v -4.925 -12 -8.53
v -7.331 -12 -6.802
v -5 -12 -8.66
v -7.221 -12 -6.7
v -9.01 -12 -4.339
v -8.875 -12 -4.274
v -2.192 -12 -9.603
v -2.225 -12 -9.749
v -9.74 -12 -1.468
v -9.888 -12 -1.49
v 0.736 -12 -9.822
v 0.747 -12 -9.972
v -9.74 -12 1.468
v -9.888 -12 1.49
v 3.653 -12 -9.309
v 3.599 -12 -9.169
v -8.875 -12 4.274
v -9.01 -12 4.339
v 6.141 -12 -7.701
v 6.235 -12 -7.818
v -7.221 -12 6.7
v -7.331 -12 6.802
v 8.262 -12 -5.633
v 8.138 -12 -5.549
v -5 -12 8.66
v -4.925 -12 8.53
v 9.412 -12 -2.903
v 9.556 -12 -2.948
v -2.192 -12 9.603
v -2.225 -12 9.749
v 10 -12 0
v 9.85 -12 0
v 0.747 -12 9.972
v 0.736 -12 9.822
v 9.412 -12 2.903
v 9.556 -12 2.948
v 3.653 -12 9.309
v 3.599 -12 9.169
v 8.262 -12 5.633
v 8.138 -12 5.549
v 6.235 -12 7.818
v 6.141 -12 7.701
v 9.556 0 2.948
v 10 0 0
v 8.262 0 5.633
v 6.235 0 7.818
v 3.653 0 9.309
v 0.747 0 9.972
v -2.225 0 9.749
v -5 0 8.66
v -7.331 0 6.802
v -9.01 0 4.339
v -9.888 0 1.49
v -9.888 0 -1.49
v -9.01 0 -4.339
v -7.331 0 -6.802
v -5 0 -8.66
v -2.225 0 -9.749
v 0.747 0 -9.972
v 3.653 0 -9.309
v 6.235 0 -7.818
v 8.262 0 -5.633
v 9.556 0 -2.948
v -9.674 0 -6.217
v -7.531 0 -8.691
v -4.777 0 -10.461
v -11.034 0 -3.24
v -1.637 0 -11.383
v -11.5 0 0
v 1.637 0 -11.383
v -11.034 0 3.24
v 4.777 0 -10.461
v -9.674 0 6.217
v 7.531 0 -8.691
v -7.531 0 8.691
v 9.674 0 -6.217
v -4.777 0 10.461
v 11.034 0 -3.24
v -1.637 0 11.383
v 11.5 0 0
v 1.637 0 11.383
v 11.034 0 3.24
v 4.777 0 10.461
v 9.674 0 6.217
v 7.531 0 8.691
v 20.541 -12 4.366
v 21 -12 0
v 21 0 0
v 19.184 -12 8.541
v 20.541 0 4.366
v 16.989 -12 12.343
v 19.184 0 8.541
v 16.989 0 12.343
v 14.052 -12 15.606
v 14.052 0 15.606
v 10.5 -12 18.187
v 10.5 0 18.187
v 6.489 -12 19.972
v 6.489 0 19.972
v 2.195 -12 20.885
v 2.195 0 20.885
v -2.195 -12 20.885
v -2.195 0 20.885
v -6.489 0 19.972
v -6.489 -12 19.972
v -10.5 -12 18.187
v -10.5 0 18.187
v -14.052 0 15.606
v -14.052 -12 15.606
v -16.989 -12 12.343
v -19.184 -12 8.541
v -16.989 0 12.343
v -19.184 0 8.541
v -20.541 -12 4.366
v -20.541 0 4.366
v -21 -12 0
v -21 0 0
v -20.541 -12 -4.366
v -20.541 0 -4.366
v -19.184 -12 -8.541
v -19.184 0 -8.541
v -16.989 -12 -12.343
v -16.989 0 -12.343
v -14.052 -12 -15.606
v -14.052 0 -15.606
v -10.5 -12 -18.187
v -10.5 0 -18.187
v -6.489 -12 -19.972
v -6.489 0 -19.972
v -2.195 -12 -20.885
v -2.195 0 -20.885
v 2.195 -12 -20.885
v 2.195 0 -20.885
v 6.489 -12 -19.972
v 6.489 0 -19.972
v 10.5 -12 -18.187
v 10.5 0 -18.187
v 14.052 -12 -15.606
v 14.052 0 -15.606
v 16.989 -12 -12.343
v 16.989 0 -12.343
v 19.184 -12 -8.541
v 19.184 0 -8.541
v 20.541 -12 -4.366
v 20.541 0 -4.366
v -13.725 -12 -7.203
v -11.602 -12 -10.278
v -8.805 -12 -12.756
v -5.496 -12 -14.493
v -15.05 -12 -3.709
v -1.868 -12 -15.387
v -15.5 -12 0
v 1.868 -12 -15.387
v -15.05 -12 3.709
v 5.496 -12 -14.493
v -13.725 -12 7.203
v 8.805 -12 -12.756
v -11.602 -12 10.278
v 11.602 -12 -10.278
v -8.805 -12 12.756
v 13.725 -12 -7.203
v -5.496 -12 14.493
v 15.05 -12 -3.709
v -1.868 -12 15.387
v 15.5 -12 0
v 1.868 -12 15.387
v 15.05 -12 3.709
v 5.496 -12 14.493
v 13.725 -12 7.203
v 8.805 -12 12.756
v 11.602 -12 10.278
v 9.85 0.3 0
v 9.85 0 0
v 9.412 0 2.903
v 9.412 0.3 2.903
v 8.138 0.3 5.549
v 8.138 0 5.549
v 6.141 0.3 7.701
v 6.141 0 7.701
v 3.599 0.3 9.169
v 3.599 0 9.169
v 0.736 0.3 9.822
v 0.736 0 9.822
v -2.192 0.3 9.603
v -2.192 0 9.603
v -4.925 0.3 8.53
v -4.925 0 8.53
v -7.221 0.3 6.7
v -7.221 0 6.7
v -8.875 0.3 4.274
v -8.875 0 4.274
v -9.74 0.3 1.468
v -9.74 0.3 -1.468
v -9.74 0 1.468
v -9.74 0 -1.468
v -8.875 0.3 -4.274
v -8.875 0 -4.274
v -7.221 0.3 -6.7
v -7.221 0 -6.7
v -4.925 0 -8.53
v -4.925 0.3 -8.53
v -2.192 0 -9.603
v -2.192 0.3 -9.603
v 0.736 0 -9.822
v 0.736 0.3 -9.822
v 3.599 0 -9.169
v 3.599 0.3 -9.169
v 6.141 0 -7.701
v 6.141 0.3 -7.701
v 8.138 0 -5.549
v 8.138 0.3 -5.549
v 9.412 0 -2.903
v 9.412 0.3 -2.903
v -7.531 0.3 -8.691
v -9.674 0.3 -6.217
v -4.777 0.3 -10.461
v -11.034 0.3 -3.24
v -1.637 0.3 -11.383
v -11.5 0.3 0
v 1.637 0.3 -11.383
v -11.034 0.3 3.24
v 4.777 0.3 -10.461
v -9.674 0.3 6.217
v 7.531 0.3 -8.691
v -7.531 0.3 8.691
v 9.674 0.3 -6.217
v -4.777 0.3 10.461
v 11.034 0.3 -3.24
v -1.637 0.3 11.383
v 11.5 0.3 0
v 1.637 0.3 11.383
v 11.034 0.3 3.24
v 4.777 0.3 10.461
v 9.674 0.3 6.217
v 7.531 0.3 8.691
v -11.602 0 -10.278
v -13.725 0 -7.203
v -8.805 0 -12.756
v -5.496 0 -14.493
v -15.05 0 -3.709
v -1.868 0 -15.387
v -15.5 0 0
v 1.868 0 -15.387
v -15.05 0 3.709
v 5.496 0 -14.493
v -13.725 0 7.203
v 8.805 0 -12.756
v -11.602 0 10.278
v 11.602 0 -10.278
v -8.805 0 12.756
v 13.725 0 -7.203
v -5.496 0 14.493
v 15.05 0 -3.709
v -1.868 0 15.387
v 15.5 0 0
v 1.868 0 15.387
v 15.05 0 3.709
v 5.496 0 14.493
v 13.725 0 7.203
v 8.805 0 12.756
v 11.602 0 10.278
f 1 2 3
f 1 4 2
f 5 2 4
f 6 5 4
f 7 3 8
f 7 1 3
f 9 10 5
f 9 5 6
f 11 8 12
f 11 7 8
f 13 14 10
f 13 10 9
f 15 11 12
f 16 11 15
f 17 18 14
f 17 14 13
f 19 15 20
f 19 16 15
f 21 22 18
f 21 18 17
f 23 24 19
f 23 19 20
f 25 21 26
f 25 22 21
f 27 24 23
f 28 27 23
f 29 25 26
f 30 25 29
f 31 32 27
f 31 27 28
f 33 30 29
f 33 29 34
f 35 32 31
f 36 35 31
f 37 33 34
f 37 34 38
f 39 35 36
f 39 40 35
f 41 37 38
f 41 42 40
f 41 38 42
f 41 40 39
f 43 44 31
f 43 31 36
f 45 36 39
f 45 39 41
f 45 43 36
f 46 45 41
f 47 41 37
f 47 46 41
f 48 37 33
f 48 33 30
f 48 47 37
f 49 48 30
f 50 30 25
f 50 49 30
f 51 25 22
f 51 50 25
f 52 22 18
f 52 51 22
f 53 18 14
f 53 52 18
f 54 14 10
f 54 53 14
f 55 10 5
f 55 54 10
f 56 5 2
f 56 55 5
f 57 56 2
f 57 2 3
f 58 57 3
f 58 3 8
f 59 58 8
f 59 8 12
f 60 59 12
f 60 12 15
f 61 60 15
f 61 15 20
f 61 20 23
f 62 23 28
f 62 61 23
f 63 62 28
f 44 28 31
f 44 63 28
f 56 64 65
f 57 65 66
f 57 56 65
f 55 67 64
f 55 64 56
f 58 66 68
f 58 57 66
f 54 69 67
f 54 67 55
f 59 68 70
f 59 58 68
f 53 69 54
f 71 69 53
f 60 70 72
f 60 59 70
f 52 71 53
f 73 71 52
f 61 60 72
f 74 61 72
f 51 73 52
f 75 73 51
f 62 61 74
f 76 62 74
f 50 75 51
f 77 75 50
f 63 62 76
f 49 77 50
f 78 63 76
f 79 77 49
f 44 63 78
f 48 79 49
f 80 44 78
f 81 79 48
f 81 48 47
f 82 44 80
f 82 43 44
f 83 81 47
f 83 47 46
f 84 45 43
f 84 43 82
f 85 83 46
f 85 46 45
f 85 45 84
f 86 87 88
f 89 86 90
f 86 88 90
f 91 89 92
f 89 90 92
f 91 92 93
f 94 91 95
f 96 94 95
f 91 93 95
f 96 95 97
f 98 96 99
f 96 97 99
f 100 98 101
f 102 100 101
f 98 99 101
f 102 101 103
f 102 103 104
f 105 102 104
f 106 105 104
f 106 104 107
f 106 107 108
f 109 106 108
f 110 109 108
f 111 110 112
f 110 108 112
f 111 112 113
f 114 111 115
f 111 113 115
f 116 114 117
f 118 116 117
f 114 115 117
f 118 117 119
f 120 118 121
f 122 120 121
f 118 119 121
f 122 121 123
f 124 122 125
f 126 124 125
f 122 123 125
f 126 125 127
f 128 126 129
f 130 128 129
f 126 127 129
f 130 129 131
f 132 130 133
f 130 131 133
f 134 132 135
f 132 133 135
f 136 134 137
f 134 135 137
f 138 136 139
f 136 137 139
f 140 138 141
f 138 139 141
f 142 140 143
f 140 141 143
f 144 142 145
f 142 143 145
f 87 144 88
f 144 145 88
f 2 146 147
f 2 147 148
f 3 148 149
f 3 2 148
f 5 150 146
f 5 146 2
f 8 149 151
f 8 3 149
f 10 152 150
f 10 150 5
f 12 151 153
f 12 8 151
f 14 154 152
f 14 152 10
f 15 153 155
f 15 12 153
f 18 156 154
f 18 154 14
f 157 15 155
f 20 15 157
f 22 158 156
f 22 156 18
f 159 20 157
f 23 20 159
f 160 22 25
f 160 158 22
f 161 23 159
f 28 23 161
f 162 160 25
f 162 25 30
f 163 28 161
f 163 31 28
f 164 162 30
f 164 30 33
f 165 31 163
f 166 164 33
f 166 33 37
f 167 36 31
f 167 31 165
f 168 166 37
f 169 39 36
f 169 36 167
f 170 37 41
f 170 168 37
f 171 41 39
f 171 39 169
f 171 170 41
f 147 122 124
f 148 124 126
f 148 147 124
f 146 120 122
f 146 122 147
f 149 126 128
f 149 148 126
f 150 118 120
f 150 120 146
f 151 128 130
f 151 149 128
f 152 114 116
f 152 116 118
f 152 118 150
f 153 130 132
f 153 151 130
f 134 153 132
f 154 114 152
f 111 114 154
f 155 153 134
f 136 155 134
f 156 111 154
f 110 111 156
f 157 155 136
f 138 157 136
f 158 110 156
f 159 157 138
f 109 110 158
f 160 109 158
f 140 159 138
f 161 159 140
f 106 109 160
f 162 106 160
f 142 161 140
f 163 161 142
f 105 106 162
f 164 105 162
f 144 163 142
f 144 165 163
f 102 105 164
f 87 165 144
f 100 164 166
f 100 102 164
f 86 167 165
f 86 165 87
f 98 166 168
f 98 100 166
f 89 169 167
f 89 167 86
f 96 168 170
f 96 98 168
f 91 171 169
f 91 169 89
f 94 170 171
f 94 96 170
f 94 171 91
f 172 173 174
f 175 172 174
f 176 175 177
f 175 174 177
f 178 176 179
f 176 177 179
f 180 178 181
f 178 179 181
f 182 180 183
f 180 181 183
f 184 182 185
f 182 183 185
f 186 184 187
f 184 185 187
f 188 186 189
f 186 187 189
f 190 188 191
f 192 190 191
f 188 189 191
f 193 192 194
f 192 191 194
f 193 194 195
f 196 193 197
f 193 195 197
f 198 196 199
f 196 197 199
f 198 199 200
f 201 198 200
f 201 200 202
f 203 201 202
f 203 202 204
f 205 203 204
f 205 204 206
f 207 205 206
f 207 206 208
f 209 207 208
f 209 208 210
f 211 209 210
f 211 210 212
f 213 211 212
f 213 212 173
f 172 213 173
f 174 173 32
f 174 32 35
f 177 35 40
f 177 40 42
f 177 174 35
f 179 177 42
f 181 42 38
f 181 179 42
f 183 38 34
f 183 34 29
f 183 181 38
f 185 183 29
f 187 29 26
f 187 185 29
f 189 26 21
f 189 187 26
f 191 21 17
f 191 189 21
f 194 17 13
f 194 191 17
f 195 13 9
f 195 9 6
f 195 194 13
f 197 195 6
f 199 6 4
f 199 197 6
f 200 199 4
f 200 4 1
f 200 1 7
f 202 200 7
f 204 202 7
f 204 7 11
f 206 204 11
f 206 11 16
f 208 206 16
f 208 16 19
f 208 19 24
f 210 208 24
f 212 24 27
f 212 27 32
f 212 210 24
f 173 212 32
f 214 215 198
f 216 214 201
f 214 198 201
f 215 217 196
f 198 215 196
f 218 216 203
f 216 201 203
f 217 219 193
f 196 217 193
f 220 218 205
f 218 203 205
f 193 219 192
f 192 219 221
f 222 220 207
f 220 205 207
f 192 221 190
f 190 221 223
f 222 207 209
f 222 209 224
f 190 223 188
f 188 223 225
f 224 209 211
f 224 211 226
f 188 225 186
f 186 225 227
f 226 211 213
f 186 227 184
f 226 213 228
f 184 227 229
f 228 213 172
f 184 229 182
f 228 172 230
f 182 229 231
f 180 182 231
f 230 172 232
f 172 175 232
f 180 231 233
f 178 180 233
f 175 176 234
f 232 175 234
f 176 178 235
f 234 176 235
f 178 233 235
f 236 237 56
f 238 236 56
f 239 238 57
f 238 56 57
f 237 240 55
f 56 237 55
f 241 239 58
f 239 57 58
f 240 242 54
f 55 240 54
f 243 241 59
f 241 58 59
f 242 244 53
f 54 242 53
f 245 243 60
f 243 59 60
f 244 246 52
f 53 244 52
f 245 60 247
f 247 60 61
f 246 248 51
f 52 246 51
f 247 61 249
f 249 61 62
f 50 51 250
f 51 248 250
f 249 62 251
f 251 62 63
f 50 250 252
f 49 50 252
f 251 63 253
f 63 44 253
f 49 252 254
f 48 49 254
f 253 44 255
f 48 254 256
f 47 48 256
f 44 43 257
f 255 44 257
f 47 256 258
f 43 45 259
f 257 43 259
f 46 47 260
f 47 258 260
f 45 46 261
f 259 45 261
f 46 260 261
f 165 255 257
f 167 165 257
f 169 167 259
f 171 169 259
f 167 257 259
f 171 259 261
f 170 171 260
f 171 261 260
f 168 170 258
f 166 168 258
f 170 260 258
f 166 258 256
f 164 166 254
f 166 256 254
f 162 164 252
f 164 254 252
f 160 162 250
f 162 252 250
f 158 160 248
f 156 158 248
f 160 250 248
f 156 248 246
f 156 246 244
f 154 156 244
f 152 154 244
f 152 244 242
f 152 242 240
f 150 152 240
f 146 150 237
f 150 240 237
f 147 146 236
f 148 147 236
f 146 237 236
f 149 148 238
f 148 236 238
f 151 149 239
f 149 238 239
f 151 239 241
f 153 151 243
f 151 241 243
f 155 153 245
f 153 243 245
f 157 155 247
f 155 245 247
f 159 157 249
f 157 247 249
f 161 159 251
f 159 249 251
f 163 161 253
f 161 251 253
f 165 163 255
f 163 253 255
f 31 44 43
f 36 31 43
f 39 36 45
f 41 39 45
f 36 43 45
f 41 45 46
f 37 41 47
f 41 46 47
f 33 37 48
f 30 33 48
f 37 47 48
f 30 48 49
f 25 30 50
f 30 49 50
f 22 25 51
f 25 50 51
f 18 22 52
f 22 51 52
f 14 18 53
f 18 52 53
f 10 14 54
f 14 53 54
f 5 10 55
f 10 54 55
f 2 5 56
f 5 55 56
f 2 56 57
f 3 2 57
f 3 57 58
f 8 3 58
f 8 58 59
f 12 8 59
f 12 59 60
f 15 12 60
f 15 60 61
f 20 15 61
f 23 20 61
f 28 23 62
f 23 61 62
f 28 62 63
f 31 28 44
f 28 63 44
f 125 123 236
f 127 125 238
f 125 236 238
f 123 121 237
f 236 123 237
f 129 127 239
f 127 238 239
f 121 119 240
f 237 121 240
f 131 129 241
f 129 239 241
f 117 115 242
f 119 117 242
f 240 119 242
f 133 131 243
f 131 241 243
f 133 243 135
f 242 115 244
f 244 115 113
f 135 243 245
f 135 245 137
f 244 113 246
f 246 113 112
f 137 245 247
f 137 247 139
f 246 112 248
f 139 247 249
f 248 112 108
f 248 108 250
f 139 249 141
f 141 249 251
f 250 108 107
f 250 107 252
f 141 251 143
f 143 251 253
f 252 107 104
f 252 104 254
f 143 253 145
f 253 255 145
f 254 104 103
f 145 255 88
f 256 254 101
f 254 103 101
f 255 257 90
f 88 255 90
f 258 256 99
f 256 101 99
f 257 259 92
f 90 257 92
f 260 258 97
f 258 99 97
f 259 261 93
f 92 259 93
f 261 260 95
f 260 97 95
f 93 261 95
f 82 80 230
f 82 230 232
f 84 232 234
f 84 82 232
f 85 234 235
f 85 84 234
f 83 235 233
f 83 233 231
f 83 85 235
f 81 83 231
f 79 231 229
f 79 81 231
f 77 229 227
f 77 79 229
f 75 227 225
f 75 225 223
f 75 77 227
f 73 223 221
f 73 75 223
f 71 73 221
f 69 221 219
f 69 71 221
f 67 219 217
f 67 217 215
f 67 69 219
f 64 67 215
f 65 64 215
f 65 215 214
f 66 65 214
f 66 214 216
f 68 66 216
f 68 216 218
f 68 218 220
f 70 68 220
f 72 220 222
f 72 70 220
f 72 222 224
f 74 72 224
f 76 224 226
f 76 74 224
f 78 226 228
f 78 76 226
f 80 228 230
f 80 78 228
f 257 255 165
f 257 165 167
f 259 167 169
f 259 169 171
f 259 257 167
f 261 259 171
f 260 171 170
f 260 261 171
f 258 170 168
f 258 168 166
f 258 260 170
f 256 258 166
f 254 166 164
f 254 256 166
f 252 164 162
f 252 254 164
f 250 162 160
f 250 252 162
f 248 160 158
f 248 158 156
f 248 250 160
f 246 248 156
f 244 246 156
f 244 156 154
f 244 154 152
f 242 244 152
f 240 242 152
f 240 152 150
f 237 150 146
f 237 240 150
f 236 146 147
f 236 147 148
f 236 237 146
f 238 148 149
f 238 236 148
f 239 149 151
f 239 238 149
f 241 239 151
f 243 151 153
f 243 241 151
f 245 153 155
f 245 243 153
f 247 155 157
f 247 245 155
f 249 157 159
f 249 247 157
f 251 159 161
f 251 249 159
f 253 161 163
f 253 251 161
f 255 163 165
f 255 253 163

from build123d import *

# Parameters (mm, degrees)
F0_R     = 21
F0_R_2   = 15.5
F1_DEPTH = 12
F0_R_3   = 10
F2_DEPTH = 12
F3_R     = 10
F3_R_2   = 9.85
F4_DEPTH = 12
F3_R_3   = 11.5
F5_DEPTH = 0.3
F6_DEPTH = 25


with BuildPart() as f1:
    # F0 (on Front) → F1 (new body)
    with BuildSketch(Plane.XZ):
        Circle(F0_R)
        Circle(F0_R_2, mode=Mode.SUBTRACT)
    extrude(amount=F1_DEPTH)


with BuildPart() as f2:
    # F0 (on Front) → F2 (new body)
    with BuildSketch(Plane.XZ):
        Circle(F0_R_2)
        Circle(F0_R_3, mode=Mode.SUBTRACT)
    extrude(amount=F2_DEPTH)


with BuildPart() as f4:
    # F3 (on Front) → F4 (new body)
    with BuildSketch(Plane.XZ):
        Circle(F3_R)
        Circle(F3_R_2, mode=Mode.SUBTRACT)
    extrude(amount=F4_DEPTH)

    # F3 (on Front) → F5 (join)
    with BuildSketch(Plane.XZ):
        Circle(F3_R_3)
        Circle(F3_R, mode=Mode.SUBTRACT)
        Circle(F3_R)
        Circle(F3_R_2, mode=Mode.SUBTRACT)
        Circle(F3_R_2)
    extrude(amount=-F5_DEPTH)

    # F3 (on Front) → F6 (cut)
    with BuildSketch(Plane.XZ):
        Circle(F3_R_2)
    extrude(amount=-F6_DEPTH, mode=Mode.SUBTRACT)


solid = Compound([f1.part, f2.part, f4.part])
